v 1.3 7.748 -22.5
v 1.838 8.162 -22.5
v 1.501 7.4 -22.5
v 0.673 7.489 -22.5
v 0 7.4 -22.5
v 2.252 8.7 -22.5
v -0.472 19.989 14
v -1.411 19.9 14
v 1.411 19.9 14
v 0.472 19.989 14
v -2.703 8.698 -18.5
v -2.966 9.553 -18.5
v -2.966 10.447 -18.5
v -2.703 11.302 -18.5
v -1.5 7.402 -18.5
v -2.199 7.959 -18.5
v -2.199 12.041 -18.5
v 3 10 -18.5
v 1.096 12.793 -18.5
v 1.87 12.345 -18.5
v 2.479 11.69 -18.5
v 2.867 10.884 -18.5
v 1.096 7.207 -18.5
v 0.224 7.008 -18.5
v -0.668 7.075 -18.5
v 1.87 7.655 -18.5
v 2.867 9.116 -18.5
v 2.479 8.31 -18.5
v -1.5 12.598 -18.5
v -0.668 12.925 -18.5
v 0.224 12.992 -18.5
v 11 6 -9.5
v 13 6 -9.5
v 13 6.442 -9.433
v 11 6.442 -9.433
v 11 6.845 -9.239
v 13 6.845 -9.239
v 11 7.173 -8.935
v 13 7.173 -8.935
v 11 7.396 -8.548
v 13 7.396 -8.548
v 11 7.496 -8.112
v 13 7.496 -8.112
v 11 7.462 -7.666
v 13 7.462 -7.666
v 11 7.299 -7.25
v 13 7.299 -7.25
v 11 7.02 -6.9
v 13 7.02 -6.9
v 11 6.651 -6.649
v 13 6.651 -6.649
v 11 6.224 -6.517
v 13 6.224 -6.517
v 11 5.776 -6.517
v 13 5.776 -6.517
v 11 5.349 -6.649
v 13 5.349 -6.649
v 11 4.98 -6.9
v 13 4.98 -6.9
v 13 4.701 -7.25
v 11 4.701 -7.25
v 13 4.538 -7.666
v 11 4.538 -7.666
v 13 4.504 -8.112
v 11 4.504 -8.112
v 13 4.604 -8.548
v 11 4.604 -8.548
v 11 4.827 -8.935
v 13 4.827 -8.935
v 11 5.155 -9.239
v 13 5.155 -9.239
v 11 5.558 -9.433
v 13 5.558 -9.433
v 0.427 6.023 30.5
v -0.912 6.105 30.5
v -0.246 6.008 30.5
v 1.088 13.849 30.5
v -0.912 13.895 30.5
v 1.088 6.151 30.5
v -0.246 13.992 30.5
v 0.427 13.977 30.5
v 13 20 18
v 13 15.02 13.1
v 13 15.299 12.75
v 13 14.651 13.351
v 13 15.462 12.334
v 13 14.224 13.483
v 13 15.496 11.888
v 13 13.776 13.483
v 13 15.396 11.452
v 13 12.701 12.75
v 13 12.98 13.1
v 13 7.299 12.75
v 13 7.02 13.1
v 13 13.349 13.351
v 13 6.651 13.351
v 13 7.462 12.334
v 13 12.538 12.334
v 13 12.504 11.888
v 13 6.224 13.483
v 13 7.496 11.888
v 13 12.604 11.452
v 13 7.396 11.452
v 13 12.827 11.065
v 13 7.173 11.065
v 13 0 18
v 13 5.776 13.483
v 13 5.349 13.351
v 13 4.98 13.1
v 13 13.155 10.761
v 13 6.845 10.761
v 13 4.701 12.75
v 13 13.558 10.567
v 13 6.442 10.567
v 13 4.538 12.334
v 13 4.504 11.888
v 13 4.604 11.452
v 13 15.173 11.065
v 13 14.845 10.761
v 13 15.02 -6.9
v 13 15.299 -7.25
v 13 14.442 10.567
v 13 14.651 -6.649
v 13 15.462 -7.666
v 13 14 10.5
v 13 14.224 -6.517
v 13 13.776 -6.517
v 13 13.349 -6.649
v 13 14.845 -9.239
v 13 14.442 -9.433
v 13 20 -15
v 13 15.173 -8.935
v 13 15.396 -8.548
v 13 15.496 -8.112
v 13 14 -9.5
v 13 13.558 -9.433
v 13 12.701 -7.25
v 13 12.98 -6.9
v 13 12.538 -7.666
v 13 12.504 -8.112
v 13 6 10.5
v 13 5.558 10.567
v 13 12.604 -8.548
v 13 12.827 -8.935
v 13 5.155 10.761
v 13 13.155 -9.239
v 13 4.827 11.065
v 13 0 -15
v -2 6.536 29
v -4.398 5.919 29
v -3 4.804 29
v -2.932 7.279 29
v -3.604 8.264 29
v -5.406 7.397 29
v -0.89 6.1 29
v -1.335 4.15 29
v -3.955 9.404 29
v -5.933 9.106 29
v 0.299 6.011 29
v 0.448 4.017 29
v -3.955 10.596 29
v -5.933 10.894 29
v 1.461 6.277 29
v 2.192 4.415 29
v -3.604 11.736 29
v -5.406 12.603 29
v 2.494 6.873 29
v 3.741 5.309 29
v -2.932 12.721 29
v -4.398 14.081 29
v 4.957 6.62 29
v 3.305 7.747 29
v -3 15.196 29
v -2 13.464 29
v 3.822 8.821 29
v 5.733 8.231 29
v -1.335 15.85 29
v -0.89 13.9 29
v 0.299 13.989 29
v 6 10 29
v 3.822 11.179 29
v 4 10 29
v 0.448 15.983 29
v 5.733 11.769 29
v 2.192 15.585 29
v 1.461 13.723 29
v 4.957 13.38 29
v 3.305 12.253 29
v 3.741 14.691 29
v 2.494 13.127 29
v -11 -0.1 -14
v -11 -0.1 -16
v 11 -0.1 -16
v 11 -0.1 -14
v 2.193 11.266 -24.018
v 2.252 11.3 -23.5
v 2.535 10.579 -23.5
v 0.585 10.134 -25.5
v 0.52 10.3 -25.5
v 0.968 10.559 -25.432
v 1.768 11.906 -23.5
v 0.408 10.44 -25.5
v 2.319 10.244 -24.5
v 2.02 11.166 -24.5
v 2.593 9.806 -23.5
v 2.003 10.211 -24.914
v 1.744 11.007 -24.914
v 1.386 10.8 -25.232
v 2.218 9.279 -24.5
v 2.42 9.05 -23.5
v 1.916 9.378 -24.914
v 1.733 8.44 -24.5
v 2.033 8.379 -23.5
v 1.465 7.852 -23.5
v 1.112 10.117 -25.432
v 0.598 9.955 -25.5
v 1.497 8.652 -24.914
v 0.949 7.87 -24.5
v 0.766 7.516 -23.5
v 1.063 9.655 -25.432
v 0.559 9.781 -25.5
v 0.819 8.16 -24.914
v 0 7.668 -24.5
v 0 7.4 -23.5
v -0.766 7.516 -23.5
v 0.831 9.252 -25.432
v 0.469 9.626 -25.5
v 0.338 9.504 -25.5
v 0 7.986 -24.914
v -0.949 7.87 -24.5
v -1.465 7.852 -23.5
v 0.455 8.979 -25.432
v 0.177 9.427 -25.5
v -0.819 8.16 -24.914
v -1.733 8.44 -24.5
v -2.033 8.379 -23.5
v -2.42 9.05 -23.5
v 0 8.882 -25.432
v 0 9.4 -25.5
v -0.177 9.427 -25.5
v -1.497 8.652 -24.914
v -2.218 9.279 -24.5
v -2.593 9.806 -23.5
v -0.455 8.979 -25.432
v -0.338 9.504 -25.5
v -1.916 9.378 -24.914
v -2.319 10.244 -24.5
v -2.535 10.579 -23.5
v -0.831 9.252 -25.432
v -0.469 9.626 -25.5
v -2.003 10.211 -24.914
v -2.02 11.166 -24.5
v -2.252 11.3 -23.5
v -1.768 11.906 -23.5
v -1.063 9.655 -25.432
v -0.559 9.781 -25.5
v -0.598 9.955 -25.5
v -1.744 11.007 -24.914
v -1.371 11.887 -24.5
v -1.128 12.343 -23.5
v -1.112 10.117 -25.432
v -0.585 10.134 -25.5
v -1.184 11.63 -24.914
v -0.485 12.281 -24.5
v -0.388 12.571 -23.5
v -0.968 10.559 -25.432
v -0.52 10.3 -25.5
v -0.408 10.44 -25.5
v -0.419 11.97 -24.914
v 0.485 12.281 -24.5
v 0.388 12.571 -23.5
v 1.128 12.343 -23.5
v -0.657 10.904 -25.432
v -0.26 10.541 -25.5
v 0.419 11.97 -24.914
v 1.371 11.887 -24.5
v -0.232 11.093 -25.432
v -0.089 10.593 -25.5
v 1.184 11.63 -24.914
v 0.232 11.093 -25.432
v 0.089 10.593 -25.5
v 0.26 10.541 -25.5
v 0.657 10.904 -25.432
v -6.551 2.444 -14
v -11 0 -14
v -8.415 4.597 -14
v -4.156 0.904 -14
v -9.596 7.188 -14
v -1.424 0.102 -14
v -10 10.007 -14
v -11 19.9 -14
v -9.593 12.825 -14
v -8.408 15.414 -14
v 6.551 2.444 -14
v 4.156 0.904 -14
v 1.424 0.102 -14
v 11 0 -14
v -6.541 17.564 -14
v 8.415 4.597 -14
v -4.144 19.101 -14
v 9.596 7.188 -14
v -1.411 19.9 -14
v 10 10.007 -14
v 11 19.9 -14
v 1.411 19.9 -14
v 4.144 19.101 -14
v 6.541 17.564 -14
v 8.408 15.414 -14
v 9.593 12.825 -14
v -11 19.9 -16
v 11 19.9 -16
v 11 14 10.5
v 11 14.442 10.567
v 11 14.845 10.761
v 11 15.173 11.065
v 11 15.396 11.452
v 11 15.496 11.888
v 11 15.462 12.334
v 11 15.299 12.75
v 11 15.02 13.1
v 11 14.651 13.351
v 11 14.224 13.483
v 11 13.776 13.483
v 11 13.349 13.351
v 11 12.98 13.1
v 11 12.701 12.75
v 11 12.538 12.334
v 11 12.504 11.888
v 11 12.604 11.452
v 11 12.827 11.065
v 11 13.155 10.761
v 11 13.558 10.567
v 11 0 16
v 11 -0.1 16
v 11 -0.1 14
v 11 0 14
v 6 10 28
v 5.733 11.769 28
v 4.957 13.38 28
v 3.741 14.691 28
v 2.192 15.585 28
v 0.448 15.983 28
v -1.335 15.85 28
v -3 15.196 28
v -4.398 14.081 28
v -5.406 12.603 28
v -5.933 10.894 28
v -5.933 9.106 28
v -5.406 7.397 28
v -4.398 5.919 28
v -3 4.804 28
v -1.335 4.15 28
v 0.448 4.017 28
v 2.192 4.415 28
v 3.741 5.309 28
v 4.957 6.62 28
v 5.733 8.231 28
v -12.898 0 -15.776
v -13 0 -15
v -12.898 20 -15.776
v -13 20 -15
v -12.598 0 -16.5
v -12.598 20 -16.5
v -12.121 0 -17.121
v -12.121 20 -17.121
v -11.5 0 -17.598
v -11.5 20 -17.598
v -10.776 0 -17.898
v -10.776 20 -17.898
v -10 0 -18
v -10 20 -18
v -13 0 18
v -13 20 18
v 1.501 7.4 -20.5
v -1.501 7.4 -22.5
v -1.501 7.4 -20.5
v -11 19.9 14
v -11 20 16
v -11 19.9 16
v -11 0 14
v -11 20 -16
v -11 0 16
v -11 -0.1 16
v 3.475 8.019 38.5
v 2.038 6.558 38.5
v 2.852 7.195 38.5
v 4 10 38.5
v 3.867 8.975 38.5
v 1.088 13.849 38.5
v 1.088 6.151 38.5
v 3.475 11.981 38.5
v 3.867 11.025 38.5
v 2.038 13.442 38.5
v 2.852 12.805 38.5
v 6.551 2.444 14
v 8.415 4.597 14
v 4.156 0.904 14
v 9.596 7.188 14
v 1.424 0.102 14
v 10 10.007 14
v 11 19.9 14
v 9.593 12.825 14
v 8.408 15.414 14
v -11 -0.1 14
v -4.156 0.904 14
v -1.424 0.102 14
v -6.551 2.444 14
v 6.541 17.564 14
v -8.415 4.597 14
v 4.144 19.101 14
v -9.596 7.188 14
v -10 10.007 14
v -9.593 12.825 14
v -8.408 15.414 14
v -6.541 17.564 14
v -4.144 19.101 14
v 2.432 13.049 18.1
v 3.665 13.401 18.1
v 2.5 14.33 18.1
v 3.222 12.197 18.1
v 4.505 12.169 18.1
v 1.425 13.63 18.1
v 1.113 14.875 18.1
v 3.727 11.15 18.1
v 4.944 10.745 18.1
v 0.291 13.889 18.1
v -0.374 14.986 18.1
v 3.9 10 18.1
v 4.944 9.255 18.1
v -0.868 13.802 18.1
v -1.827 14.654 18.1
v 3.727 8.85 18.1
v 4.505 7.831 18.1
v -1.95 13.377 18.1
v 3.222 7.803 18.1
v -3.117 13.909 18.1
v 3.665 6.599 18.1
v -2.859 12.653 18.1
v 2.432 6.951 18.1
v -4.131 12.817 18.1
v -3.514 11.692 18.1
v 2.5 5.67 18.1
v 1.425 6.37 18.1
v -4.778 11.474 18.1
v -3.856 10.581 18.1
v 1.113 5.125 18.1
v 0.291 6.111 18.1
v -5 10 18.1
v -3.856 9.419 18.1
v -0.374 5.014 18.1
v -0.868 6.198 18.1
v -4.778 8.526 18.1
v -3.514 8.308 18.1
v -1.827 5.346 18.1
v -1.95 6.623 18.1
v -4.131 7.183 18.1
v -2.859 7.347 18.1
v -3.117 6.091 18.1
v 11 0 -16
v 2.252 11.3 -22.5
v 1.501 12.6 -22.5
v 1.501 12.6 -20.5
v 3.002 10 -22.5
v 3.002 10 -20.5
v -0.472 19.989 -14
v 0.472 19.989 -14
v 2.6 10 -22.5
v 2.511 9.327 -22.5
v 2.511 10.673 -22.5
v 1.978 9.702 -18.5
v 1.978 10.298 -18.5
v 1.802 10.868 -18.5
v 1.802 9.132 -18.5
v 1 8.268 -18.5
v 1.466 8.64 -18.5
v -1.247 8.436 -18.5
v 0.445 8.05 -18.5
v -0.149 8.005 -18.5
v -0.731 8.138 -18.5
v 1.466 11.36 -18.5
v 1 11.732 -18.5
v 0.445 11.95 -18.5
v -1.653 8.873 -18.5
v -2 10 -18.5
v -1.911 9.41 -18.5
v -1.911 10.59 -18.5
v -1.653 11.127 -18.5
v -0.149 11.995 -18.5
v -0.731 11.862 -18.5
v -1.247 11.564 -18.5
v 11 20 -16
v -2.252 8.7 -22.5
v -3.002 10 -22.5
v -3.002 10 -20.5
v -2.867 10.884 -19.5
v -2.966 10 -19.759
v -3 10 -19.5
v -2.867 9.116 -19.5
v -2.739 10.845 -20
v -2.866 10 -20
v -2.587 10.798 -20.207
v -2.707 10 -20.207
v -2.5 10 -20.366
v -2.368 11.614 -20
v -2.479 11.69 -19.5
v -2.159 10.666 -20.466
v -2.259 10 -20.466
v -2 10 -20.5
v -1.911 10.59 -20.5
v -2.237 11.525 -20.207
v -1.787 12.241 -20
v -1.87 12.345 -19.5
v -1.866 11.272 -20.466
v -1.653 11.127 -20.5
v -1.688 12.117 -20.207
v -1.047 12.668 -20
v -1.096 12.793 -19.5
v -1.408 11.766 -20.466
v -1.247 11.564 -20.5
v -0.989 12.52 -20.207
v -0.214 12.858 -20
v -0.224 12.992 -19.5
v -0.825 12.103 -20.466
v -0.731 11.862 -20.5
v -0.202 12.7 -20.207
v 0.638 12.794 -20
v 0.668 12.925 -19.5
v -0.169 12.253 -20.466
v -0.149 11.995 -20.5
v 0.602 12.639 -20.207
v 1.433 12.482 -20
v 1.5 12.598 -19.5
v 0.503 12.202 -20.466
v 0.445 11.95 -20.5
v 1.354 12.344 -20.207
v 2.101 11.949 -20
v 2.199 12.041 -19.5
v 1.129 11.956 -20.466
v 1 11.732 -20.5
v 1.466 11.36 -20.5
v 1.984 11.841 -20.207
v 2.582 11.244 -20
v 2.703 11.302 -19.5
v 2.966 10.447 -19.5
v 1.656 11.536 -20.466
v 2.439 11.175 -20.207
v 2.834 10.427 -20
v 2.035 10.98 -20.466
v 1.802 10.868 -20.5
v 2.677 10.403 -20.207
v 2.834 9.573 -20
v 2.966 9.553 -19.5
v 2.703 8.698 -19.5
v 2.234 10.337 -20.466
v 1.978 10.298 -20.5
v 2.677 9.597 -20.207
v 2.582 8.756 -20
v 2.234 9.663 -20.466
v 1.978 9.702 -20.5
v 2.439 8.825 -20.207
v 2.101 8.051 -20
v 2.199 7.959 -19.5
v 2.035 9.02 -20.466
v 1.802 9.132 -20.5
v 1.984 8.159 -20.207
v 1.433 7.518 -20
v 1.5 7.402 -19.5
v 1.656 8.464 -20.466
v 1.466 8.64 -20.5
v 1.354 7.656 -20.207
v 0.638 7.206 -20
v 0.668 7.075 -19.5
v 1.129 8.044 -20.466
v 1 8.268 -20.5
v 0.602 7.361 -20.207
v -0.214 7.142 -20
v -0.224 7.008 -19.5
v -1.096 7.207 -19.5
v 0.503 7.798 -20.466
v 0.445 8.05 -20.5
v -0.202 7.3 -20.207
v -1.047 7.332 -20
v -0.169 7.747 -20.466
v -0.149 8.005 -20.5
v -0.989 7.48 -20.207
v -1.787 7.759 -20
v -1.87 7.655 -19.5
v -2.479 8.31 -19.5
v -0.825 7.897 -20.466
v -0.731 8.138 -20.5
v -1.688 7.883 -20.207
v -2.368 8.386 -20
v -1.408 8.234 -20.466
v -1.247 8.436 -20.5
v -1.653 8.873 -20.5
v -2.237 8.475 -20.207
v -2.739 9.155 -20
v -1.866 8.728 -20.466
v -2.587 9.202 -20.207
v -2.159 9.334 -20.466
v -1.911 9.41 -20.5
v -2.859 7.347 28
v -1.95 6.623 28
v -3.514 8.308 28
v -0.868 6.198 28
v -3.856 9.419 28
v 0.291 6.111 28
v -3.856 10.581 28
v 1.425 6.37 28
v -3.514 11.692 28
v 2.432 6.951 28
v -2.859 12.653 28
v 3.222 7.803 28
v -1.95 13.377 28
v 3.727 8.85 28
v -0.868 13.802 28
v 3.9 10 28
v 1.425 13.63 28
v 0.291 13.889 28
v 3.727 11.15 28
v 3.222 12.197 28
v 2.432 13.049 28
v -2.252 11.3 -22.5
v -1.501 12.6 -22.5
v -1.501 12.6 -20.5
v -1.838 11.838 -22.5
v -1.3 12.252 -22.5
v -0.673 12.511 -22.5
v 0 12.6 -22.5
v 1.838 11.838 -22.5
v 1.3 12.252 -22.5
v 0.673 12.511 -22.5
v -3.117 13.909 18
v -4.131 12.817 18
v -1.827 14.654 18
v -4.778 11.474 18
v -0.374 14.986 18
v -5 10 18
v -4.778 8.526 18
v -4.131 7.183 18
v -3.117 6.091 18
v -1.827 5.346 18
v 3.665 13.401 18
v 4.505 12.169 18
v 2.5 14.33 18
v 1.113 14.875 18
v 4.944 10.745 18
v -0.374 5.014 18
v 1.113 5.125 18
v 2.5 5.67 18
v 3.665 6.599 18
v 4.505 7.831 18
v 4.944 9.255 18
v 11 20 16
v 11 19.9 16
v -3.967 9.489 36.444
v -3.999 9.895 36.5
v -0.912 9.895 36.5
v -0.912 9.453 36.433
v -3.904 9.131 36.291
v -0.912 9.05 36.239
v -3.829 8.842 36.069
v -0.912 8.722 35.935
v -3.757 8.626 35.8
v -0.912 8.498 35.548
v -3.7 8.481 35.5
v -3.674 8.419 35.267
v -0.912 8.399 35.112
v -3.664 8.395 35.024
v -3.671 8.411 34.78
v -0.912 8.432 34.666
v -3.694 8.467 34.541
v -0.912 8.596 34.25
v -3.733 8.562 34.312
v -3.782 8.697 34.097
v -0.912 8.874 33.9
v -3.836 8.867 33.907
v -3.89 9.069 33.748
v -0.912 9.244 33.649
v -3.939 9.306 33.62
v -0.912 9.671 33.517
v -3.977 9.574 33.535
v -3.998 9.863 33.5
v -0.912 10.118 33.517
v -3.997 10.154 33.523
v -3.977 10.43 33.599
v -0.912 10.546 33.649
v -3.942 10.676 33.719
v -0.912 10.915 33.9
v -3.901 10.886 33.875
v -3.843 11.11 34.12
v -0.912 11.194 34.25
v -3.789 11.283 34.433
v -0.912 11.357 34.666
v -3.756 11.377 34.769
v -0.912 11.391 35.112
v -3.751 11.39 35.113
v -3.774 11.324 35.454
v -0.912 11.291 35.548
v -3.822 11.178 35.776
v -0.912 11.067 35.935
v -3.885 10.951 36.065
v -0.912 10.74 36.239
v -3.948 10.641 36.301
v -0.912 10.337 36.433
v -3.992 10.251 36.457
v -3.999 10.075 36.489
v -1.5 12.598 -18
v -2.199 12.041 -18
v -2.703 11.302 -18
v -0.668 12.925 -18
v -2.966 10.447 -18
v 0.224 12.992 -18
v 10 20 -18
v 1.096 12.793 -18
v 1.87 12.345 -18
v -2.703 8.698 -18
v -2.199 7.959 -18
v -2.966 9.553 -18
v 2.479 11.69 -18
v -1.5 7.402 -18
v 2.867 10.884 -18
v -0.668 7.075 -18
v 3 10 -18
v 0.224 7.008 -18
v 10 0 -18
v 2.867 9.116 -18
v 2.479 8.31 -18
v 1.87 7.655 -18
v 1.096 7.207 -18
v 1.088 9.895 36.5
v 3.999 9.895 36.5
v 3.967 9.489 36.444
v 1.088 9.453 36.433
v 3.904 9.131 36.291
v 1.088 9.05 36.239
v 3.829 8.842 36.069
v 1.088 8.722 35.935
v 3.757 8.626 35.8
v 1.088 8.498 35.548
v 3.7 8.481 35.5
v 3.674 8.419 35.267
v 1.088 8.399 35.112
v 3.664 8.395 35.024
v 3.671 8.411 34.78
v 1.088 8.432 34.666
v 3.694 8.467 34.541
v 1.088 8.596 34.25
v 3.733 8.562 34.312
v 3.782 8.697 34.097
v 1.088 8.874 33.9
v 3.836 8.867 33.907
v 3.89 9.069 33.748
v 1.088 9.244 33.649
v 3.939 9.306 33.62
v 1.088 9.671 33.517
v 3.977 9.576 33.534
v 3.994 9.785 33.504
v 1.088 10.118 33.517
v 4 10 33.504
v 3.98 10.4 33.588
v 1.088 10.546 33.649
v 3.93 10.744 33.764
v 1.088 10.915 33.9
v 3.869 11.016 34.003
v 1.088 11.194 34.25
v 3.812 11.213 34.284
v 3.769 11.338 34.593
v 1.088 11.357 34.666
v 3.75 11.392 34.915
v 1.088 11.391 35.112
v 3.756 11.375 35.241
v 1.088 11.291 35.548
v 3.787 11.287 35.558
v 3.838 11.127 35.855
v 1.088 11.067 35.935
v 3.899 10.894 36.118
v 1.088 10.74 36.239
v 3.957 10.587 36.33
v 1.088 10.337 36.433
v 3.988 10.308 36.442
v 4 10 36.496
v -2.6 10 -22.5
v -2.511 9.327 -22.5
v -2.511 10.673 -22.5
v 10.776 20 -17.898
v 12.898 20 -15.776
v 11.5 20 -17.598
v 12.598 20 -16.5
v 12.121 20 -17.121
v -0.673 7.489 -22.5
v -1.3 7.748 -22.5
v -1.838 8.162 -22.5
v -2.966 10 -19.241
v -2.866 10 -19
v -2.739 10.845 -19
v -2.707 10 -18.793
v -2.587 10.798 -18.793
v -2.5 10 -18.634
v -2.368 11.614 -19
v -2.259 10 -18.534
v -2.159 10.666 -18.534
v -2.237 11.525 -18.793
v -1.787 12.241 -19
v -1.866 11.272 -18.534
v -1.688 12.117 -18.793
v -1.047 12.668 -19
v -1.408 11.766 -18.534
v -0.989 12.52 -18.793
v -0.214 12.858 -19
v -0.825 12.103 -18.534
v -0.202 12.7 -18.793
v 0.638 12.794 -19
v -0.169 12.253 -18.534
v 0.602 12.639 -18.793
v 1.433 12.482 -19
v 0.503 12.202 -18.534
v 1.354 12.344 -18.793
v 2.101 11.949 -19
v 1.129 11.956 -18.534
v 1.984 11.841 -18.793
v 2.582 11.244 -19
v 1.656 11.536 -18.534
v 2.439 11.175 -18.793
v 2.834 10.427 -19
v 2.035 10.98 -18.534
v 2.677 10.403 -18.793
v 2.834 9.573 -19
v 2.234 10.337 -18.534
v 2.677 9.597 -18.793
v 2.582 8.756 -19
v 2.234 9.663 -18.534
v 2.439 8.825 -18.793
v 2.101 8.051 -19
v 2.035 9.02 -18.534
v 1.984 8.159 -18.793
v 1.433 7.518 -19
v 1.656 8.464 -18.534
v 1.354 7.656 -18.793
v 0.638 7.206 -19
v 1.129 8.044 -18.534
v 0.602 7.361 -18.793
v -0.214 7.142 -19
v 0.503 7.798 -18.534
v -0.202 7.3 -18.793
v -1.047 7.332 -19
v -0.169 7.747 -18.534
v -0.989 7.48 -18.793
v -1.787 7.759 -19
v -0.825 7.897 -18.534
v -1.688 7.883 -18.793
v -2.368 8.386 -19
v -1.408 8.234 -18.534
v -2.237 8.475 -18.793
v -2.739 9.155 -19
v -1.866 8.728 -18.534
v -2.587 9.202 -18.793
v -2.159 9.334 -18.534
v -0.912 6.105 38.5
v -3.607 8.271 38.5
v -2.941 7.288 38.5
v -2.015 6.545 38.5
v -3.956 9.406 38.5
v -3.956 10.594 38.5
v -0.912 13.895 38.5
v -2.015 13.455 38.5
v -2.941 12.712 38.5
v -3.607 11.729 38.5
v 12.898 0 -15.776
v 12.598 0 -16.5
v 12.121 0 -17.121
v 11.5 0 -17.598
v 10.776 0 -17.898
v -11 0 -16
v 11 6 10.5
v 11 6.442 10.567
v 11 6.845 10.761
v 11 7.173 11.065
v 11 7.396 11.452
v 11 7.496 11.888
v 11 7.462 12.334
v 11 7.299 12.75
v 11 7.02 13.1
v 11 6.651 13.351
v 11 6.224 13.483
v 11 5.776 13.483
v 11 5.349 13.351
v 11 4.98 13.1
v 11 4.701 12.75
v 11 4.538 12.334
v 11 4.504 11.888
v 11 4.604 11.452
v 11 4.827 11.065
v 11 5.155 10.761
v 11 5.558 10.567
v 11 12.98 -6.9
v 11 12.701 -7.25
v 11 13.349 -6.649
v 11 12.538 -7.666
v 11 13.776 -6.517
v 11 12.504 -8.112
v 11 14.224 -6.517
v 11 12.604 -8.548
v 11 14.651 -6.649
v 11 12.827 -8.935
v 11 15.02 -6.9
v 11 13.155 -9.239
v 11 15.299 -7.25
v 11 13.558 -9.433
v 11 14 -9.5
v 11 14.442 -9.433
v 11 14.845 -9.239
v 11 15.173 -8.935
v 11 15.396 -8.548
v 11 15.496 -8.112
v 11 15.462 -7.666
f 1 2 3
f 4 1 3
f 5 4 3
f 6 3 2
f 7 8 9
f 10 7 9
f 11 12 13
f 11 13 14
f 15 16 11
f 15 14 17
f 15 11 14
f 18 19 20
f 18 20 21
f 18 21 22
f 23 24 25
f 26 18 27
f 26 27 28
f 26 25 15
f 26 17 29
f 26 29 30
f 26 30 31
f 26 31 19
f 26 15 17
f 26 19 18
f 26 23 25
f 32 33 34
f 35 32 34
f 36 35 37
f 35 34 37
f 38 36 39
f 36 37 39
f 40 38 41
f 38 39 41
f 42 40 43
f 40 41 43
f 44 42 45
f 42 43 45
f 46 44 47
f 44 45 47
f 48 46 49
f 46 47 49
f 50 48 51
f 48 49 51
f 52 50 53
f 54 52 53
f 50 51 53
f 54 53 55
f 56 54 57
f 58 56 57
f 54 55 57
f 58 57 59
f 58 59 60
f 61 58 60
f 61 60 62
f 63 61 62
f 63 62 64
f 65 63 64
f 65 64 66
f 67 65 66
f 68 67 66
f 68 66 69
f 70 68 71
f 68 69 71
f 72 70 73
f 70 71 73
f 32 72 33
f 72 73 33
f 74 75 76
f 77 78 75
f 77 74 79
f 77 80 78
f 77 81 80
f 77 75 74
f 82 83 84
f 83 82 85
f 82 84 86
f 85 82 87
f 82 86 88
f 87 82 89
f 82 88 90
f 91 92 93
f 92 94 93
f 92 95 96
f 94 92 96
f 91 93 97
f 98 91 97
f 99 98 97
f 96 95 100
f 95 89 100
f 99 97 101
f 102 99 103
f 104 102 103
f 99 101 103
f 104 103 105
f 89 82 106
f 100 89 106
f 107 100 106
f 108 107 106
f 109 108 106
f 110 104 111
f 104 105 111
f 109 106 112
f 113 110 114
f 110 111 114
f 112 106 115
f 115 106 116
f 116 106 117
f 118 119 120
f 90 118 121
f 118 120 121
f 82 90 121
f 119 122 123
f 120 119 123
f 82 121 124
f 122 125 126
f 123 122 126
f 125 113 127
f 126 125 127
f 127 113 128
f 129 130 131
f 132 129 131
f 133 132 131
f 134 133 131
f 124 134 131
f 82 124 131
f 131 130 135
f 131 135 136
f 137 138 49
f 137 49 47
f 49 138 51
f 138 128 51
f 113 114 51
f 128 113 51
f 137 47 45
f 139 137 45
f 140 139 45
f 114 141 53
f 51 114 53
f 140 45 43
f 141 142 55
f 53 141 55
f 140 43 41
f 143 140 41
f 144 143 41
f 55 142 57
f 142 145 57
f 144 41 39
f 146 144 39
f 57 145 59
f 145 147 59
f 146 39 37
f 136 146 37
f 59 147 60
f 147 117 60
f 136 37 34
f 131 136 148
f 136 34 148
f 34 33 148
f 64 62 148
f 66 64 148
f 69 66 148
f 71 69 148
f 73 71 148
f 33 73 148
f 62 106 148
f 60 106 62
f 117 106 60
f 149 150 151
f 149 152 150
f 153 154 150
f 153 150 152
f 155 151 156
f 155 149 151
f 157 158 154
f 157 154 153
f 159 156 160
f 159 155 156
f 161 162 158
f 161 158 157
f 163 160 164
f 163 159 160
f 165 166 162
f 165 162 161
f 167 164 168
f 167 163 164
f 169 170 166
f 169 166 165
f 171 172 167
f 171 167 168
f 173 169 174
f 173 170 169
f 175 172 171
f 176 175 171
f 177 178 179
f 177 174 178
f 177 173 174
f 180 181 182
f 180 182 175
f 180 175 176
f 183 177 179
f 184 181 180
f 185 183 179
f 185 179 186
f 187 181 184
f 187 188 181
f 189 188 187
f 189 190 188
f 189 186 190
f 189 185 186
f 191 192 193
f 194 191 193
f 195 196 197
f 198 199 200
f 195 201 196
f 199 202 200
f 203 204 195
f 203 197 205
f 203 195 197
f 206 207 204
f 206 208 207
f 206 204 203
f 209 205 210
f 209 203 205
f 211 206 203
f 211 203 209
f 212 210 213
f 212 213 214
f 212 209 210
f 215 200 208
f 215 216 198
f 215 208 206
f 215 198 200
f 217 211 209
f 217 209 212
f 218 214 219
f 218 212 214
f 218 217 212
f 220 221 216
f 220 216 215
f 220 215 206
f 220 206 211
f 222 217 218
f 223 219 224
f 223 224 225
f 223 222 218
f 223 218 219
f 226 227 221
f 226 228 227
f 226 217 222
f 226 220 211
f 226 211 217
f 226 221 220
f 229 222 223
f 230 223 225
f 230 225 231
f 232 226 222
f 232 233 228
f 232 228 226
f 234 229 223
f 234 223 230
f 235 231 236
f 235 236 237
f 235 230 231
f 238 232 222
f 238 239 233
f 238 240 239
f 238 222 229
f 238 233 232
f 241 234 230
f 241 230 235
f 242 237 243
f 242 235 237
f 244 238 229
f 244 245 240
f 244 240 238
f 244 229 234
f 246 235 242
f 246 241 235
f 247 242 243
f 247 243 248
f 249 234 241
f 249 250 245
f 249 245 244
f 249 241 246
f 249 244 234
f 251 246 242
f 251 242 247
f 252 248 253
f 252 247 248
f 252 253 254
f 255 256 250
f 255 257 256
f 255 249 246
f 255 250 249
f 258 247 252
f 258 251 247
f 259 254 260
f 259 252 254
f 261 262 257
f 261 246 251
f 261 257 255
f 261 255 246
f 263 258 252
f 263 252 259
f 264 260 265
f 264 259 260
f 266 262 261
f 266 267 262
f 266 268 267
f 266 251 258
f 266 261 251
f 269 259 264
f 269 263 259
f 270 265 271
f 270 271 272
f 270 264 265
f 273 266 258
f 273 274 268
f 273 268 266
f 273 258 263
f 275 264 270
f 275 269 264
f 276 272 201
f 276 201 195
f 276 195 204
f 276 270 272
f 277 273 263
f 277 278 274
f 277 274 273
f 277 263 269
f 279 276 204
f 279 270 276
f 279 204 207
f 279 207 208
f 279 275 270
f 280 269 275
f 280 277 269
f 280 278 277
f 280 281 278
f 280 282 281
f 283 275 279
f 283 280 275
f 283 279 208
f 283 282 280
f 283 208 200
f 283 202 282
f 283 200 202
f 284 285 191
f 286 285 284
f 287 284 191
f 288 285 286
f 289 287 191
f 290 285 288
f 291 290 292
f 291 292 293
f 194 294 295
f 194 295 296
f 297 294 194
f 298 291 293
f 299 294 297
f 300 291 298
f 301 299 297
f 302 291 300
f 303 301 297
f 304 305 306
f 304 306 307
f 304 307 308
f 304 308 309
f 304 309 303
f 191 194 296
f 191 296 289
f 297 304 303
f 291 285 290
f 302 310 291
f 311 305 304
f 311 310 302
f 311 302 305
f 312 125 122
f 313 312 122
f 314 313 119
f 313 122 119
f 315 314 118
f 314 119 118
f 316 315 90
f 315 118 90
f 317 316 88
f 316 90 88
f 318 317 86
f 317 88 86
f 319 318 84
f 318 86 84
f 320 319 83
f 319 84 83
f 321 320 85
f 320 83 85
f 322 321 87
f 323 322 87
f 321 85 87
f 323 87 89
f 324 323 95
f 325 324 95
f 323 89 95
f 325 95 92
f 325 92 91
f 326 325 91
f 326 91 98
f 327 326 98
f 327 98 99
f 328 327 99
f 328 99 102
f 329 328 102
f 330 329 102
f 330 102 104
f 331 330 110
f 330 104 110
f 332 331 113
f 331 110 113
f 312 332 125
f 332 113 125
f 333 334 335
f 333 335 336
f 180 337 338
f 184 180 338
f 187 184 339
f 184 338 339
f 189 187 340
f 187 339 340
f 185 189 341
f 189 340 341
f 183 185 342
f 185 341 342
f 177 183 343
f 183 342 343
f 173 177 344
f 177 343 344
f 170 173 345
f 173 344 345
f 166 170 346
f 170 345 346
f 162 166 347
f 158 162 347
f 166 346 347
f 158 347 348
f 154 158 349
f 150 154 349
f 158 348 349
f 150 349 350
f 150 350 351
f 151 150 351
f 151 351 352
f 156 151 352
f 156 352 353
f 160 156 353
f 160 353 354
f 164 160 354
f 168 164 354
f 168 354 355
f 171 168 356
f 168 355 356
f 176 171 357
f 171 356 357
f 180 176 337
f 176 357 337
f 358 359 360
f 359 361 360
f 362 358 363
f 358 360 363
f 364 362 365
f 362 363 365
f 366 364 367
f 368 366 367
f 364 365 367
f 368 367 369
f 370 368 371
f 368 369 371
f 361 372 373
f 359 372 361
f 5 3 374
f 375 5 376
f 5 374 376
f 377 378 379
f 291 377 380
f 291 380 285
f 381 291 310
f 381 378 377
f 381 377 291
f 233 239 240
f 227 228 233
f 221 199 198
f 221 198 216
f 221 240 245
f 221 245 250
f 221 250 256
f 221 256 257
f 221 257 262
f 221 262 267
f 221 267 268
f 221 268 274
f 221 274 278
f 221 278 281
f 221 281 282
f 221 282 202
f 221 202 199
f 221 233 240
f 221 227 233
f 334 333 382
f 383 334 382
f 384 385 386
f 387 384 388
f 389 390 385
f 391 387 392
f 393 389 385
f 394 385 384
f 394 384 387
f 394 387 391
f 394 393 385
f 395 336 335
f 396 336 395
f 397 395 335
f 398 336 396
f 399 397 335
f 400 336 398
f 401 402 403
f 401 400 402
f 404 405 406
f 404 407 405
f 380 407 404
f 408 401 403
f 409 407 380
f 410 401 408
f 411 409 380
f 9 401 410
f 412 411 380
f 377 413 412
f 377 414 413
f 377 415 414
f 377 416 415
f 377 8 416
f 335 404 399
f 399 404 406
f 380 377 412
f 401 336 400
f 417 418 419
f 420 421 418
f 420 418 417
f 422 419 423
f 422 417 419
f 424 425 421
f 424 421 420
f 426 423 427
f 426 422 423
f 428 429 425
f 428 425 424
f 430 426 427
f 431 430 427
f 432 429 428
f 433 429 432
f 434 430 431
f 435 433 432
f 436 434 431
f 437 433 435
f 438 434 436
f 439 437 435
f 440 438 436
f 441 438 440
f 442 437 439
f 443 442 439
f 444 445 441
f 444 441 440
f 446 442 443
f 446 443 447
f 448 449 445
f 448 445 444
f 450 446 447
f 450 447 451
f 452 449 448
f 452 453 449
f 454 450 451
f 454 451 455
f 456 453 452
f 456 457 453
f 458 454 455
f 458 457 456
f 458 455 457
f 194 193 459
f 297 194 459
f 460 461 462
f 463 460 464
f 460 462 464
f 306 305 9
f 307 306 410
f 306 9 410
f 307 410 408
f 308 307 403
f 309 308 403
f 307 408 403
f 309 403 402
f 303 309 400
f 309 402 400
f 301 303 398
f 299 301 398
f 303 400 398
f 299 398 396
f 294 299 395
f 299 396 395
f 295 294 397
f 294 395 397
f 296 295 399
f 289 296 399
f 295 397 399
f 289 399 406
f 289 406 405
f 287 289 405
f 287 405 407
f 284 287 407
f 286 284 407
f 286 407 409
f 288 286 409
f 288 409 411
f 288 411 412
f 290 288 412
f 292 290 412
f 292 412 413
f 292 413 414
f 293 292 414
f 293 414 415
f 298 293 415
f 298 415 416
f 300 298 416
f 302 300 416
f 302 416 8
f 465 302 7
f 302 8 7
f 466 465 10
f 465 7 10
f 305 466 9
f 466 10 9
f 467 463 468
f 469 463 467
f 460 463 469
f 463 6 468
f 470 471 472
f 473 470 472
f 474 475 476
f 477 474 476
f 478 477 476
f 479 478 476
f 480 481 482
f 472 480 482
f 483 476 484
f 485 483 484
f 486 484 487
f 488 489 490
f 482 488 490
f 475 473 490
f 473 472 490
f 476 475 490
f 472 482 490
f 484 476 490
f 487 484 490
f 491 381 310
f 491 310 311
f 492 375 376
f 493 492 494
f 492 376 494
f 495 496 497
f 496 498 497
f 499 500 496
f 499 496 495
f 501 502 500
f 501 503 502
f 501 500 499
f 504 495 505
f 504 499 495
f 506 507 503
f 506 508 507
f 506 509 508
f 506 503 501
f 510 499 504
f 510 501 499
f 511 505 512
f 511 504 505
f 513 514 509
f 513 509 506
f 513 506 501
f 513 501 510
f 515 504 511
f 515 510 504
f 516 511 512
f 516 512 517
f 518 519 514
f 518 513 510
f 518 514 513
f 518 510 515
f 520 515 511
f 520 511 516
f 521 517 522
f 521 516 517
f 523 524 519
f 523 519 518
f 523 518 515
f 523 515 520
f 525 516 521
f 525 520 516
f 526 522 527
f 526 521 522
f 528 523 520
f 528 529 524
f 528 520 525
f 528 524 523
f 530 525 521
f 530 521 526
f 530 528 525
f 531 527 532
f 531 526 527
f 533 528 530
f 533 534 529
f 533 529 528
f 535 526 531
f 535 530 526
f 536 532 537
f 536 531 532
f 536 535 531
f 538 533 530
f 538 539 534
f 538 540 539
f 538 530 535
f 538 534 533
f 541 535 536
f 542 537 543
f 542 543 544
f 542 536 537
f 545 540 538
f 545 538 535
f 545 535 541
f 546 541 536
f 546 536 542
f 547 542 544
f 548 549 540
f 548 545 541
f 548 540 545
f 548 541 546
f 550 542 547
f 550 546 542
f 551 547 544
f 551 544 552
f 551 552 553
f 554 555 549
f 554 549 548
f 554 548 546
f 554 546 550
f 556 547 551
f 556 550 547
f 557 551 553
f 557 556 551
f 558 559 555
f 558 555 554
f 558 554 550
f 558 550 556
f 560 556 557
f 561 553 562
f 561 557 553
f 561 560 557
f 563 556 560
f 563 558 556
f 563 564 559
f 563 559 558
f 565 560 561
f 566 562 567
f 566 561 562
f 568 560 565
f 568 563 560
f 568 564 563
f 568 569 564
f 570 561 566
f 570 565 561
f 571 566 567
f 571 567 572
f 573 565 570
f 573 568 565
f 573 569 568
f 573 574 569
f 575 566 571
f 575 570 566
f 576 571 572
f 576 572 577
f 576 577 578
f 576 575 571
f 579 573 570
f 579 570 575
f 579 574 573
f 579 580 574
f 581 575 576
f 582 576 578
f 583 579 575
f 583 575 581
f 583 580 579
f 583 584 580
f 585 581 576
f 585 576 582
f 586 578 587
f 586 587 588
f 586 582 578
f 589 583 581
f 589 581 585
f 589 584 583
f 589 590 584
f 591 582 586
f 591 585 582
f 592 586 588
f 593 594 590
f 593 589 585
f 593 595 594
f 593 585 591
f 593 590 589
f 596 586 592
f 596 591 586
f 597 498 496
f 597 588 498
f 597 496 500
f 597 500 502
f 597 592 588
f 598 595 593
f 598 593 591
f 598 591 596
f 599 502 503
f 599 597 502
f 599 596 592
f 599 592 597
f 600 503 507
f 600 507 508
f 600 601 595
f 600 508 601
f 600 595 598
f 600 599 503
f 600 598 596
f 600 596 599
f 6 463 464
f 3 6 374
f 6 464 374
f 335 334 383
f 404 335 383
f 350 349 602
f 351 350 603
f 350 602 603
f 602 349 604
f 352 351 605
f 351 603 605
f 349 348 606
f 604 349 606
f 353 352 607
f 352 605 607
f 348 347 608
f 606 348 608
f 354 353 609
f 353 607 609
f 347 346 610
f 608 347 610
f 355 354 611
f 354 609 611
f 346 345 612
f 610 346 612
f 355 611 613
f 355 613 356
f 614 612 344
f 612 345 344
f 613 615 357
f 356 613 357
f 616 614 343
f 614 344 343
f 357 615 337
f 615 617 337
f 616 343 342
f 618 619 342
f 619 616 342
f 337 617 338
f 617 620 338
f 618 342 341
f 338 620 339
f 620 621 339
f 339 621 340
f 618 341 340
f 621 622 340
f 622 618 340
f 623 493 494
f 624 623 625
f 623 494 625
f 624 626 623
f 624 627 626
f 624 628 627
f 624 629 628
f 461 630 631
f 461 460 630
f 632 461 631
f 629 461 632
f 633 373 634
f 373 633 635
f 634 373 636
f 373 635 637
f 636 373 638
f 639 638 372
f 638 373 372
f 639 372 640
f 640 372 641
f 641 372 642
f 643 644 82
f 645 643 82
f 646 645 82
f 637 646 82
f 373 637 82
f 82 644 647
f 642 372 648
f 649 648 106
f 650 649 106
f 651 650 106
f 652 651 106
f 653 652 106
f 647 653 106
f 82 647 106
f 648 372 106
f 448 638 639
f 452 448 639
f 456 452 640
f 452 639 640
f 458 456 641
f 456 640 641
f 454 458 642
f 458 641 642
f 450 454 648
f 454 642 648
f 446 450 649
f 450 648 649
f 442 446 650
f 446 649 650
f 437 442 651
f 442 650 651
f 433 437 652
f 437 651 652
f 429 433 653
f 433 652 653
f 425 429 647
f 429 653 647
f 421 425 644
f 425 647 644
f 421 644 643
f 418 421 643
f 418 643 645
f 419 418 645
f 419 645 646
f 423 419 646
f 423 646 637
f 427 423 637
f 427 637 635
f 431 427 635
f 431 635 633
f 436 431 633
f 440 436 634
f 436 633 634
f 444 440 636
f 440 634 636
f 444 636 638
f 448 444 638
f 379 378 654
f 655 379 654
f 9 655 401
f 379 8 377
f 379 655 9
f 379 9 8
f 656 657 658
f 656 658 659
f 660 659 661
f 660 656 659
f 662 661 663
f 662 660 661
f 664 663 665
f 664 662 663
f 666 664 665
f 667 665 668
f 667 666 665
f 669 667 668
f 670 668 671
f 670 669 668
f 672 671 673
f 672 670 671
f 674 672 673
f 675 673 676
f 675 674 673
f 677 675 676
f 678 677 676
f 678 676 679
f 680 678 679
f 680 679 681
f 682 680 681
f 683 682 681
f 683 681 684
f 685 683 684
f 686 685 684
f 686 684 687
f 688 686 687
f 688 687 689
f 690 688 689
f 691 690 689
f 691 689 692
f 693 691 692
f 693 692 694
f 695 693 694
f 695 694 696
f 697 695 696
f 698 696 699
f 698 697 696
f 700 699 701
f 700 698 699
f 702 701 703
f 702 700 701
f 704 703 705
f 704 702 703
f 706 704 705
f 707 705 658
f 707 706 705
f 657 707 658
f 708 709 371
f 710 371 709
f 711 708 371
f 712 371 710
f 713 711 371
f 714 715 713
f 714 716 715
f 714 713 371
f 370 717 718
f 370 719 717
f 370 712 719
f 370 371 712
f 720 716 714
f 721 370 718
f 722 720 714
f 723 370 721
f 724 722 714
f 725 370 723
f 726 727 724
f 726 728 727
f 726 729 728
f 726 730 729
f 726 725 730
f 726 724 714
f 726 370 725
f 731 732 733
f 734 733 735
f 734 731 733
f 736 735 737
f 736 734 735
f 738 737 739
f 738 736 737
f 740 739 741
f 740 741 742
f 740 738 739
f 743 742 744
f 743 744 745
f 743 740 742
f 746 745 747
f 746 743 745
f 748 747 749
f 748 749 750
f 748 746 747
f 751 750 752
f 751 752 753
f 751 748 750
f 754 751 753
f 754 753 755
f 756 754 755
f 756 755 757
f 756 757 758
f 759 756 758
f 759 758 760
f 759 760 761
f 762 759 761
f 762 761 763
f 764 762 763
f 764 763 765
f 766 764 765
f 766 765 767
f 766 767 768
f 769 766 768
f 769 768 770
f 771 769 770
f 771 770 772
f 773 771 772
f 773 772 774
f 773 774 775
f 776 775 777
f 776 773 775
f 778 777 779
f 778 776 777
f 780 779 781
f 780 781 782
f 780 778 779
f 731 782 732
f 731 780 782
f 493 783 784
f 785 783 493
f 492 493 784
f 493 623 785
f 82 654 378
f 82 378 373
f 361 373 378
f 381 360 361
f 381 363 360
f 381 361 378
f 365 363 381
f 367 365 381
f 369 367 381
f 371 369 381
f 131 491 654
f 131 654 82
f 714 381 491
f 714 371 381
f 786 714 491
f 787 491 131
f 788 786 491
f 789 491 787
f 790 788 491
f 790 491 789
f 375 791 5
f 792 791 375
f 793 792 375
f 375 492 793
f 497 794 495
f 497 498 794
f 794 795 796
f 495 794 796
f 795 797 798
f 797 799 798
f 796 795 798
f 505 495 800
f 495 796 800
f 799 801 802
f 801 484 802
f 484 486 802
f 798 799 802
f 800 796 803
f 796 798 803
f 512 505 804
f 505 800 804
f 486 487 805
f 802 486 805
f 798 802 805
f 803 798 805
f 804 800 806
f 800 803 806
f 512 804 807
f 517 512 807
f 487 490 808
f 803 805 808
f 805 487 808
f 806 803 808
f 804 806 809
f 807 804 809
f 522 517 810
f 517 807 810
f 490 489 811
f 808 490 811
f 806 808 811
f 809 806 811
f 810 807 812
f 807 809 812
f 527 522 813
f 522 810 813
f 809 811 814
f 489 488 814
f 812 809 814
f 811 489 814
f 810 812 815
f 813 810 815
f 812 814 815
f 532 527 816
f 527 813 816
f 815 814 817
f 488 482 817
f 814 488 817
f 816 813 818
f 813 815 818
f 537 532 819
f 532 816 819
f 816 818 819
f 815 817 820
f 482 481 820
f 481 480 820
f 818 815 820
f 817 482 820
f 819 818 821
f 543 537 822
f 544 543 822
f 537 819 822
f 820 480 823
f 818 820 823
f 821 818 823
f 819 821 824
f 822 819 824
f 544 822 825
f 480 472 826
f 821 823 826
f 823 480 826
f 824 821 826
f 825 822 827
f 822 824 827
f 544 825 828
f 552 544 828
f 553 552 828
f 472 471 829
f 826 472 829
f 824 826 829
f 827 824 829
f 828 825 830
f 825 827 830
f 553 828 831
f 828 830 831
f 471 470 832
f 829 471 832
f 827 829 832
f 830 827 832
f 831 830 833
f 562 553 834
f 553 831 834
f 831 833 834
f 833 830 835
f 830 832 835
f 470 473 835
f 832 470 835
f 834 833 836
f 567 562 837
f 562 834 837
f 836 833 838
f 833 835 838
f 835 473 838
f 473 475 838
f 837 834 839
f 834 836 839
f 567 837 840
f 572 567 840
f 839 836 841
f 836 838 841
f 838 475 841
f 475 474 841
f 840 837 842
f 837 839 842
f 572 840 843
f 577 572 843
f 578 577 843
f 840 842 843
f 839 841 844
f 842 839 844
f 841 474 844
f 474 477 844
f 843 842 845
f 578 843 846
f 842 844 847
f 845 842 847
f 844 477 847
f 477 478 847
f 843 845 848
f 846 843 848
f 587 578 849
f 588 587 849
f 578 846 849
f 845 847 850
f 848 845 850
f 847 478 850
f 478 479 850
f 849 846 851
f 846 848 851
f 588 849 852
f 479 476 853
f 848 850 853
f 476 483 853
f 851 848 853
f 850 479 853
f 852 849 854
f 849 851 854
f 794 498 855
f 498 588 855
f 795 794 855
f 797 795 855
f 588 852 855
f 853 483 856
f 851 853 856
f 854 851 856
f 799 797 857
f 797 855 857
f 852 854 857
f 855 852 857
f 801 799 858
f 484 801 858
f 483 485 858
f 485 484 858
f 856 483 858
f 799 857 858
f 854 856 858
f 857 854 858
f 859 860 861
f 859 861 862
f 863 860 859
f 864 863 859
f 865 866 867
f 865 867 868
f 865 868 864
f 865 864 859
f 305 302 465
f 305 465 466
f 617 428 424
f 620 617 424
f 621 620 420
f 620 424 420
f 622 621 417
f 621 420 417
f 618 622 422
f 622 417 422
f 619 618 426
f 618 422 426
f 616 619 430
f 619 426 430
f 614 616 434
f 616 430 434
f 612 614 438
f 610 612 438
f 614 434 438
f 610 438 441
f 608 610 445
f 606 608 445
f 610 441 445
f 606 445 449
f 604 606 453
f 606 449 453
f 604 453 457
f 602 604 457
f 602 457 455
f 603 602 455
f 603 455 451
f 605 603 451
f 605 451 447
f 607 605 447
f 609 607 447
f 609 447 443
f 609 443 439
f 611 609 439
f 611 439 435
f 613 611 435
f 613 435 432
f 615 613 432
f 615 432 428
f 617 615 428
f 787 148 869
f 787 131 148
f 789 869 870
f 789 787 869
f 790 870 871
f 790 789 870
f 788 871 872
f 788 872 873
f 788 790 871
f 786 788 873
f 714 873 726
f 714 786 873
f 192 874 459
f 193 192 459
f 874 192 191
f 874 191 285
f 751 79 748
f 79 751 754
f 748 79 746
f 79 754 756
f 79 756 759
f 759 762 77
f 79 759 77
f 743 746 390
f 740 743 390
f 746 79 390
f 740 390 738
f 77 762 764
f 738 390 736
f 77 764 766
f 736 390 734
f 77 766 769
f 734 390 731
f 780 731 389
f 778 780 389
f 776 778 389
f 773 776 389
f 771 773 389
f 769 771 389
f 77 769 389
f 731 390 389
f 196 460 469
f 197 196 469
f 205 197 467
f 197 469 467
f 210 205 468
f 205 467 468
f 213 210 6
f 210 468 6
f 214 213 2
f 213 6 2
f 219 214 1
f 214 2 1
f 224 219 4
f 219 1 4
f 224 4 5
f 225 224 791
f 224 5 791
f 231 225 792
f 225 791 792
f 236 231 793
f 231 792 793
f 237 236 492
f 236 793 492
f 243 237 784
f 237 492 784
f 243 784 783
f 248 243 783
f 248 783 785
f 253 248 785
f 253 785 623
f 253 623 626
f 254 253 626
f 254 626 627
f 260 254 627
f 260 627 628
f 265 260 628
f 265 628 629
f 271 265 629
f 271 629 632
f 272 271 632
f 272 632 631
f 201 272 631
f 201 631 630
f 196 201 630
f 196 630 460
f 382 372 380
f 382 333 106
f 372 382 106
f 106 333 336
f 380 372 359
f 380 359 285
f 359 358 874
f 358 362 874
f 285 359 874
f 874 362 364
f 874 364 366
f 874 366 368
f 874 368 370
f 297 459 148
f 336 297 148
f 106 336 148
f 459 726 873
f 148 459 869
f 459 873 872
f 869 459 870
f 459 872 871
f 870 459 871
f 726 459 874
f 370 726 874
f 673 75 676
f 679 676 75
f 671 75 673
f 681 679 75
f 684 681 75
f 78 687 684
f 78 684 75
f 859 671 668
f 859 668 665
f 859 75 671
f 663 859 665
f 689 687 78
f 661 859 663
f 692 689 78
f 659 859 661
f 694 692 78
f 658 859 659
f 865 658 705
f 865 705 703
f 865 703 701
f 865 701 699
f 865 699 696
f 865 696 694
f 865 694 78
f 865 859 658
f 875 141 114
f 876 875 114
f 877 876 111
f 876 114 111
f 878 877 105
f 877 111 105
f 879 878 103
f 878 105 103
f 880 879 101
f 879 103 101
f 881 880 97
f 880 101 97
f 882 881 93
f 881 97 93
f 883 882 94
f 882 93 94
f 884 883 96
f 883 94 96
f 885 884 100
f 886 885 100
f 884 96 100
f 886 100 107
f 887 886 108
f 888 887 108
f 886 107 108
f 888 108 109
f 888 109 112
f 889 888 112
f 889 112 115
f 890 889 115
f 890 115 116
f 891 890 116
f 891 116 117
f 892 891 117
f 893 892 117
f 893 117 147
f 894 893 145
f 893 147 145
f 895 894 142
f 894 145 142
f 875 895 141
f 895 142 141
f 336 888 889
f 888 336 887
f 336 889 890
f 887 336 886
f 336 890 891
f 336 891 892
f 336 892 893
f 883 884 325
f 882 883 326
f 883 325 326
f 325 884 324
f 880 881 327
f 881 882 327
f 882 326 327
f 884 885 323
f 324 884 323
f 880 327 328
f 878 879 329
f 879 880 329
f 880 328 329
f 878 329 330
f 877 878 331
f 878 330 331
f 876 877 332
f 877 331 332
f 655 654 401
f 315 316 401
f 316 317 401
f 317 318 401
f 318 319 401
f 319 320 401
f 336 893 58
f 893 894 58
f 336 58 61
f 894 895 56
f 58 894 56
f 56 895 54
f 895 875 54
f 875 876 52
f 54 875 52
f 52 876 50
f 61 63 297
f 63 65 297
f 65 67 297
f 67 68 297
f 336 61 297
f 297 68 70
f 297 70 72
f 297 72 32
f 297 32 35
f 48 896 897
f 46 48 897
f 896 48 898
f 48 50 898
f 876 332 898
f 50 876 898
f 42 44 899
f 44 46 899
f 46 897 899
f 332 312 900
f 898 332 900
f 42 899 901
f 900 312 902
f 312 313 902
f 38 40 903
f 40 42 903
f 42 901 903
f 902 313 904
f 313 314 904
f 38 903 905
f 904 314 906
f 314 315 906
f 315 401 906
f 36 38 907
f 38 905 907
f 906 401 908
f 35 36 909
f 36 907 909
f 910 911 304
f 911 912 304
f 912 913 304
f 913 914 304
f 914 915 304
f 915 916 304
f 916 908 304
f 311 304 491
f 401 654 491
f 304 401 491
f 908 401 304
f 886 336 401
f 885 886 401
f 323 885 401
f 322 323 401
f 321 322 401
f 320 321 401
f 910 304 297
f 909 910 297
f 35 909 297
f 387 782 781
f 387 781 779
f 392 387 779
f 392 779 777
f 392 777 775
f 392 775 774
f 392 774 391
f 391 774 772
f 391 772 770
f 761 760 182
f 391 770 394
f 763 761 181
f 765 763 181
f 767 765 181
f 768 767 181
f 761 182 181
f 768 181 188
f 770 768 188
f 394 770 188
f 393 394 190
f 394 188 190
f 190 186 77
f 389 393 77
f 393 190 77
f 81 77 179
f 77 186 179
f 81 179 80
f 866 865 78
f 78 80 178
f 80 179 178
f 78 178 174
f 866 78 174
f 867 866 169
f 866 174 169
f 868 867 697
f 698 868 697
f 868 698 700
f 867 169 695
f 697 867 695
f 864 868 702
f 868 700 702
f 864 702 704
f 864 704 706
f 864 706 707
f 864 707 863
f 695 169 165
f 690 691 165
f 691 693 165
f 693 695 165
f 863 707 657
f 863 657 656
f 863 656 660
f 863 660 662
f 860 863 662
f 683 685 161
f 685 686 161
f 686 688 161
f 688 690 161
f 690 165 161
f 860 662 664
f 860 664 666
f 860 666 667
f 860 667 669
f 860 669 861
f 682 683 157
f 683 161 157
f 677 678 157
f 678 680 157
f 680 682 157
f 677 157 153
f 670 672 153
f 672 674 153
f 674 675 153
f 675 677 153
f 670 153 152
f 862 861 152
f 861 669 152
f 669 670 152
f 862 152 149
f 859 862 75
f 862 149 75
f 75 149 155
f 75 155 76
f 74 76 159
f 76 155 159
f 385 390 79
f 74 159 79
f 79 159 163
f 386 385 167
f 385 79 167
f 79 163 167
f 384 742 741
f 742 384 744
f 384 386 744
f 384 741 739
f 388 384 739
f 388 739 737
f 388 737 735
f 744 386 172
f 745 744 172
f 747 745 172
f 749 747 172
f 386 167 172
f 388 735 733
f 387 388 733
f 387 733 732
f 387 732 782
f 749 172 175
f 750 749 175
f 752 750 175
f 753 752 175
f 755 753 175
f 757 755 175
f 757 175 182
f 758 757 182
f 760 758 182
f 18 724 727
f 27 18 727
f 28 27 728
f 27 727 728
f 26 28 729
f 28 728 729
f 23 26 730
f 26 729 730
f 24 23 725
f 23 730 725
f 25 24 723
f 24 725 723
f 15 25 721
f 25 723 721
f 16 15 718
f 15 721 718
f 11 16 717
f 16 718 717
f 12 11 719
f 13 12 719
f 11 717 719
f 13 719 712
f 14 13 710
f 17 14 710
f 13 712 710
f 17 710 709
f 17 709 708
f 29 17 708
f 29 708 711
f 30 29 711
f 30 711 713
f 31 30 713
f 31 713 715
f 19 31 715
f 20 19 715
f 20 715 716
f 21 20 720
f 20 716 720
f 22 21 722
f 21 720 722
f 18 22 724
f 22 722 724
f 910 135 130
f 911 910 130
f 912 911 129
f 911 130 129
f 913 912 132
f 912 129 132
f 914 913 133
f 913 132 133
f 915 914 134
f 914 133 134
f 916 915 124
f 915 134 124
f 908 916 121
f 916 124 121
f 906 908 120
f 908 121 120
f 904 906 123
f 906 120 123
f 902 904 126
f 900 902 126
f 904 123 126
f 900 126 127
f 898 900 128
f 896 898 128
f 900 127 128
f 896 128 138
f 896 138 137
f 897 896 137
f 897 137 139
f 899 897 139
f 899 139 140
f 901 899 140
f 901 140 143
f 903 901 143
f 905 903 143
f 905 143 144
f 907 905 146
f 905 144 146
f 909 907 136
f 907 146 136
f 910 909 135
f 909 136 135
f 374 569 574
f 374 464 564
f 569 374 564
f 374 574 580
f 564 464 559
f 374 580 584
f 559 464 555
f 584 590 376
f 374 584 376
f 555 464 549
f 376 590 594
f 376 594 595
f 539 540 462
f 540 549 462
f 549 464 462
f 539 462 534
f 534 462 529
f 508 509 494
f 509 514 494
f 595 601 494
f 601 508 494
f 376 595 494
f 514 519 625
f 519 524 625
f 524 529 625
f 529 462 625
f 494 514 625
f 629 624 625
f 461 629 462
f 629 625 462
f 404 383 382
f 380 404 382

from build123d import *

# Parameters (mm, degrees)
SKETCH1_W               = 26
SKETCH1_H               = 36
BOSS_EXTRUDE1_DEPTH     = 20
FILLET1_R               = 3
SKETCH2_W               = 22
SKETCH2_H               = 32
CUT_EXTRUDE1_DEPTH      = 20
SKETCH5_W               = 22
SKETCH5_H               = 20
BOSS_EXTRUDE3_DEPTH     = 2
SKETCH6_W               = 22
SKETCH6_H               = 20
BOSS_EXTRUDE4_DEPTH     = 2
SKETCH7_R               = 10
BOSS_EXTRUDE5_DEPTH     = 28
SKETCH8_R               = 3
BOSS_EXTRUDE6_DEPTH     = 0.5
SKETCH9_R               = 3
BOSS_EXTRUDE7_DEPTH     = 2
FILLET2_R               = 1
BOSS_EXTRUDE8_DEPTH     = 2
SKETCH11_R              = 2.6
BOSS_EXTRUDE9_DEPTH     = 3
FILLET4_R               = 2
SKETCH12_R              = 3.9
BOSS_EXTRUDE10_DEPTH    = 10
SKETCH13_R              = 6
BOSS_EXTRUDE11_DEPTH    = 1
SKETCH14_R              = 4
BOSS_EXTRUDE12_DEPTH    = 9.5
SKETCH15_W              = 2
SKETCH15_H              = 8
CUT_EXTRUDE3_DEPTH      = 8
CUT_EXTRUDE4_DEPTH      = 5
CUT_EXTRUDE4_DEPTH_BACK = 5
SKETCH16_R              = 1.5
SKETCH17_R              = 5
BOSS_EXTRUDE13_DEPTH    = 0.1
SKETCH18_R              = 1.5
CUT_EXTRUDE5_DEPTH      = 2


with BuildPart() as part:
    # Sketch1 → Boss-Extrude1 (new body)
    with BuildSketch(Plane(origin=(0, 0, 0), x_dir=(1, 0, 0), z_dir=(0, 1, 0))):
        Rectangle(SKETCH1_W, SKETCH1_H)
    extrude(amount=BOSS_EXTRUDE1_DEPTH)

    # Fillet1
    fillet1_edges = [part.edges().sort_by_distance(p)[0] for p in [
        (-13, 10, -18),
        (13, 10, -18),
    ]]
    fillet(fillet1_edges, radius=FILLET1_R)

    # Sketch2 → Cut-Extrude1 (cut)
    with BuildSketch(Plane(origin=(0, 20, 0), x_dir=(1, 0, 0), z_dir=(0, 1, 0))):
        Rectangle(SKETCH2_W, SKETCH2_H)
    extrude(amount=-CUT_EXTRUDE1_DEPTH, mode=Mode.SUBTRACT)

    # Sketch5 → Boss-Extrude3 (add)
    with BuildSketch(Plane.XY.offset(-16)):
        with Locations((0, 9.9)):
            Rectangle(SKETCH5_W, SKETCH5_H)
    extrude(amount=BOSS_EXTRUDE3_DEPTH)

    # Sketch6 → Boss-Extrude4 (add)
    with BuildSketch(Plane(origin=(0, 0, 16), x_dir=(-1, 0, 0), z_dir=(0, 0, -1))):
        with Locations((0, 9.9)):
            Rectangle(SKETCH6_W, SKETCH6_H)
    extrude(amount=BOSS_EXTRUDE4_DEPTH)

    # Sketch7 → Boss-Extrude5 (add)
    with BuildSketch(Plane(origin=(0, 0, 14), x_dir=(-1, 0, 0), z_dir=(0, 0, -1))):
        with Locations(Location((0, 10, 0), (0, 0, 98.109614456))):
            Circle(SKETCH7_R)
    extrude(amount=BOSS_EXTRUDE5_DEPTH)

    # Sketch8 → Boss-Extrude6 (add)
    with BuildSketch(Plane(origin=(0, 0, -18), x_dir=(-1, 0, 0), z_dir=(0, 0, -1))):
        with Locations(Location((0, 10, 0), (0, 0, 180))):
            Circle(SKETCH8_R)
    extrude(amount=BOSS_EXTRUDE6_DEPTH)

    # Sketch12 → Boss-Extrude10 (add)
    with BuildSketch(Plane.XY.offset(18)):
        with Locations((0, 10)):
            Circle(SKETCH12_R)
    extrude(amount=BOSS_EXTRUDE10_DEPTH)

    # Sketch13 → Boss-Extrude11 (add)
    with BuildSketch(Plane.XY.offset(28)):
        with Locations((0, 10)):
            Circle(SKETCH13_R)
    extrude(amount=BOSS_EXTRUDE11_DEPTH)

    # Sketch14 → Boss-Extrude12 (add)
    with BuildSketch(Plane.XY.offset(29)):
        with Locations((0, 10)):
            Circle(SKETCH14_R)
    extrude(amount=BOSS_EXTRUDE12_DEPTH)

    # Sketch15 → Cut-Extrude3 (cut)
    with BuildSketch(Plane.XY.offset(38.5)):
        with Locations((0.08840706, 10)):
            Rectangle(SKETCH15_W, SKETCH15_H)
    extrude(amount=-CUT_EXTRUDE3_DEPTH, mode=Mode.SUBTRACT)

    # Sketch16 → Cut-Extrude4 (cut, two sides: drawn at the far end of the back side and taken through both)
    with BuildSketch(Plane(origin=(-0.91159294, 0, 0), x_dir=(0, 0, -1), z_dir=(1, 0, 0)).offset(-CUT_EXTRUDE4_DEPTH_BACK)):
        with Locations(Location((-35, 9.894739826, 0), (0, 0, 180))):
            Circle(SKETCH16_R)
    extrude(amount=CUT_EXTRUDE4_DEPTH + CUT_EXTRUDE4_DEPTH_BACK, mode=Mode.SUBTRACT)

    # Sketch17 → Boss-Extrude13 (add)
    with BuildSketch(Plane.XY.offset(18)):
        with Locations(Location((0, 10, 0), (0, 0, 180))):
            Circle(SKETCH17_R)
    extrude(amount=BOSS_EXTRUDE13_DEPTH)

    # Sketch18 → Cut-Extrude5 (cut)
    with BuildSketch(Plane(origin=(13, 0, 0), x_dir=(0, 0, -1), z_dir=(1, 0, 0))):
        with Locations((-12, 14)):
            Circle(SKETCH18_R)
        with Locations((8, 14)):
            Circle(SKETCH18_R)
        with Locations((8, 6)):
            Circle(SKETCH18_R)
        with Locations((-12, 6)):
            Circle(SKETCH18_R)
    extrude(amount=-CUT_EXTRUDE5_DEPTH, mode=Mode.SUBTRACT)


with BuildPart() as body_2:
    # Sketch9 → Boss-Extrude7 (new body)
    with BuildSketch(Plane(origin=(0, 0, -18.5), x_dir=(-1, 0, 0), z_dir=(0, 0, -1))):
        with Locations((0, 10)):
            Circle(SKETCH9_R)
    extrude(amount=BOSS_EXTRUDE7_DEPTH)

    # Fillet2
    fillet2_edges = [body_2.edges().sort_by_distance(p)[0] for p in [
        (3, 10, -18.5),
        (3, 10, -20.5),
    ]]
    fillet(fillet2_edges, radius=FILLET2_R - 0.0001)  # a hair under: the kernel refuses the full size

    # Sketch10 → Boss-Extrude8 (add)
    with BuildSketch(Plane(origin=(0, 0, -20.5), x_dir=(-1, 0, 0), z_dir=(0, 0, -1))):
        Polygon((3.0022214, 10), (1.5011107, 12.6), (-1.5011107, 12.6), (-3.0022214, 10), (-1.5011107, 7.4), (1.5011107, 7.4), align=None)
    extrude(amount=BOSS_EXTRUDE8_DEPTH)

    # Sketch11 → Boss-Extrude9 (add)
    with BuildSketch(Plane(origin=(0, 0, -22.5), x_dir=(-1, 0, 0), z_dir=(0, 0, -1))):
        with Locations(Location((0, 10, 0), (0, 0, 150))):
            Circle(SKETCH11_R)
    extrude(amount=BOSS_EXTRUDE9_DEPTH)

    # Fillet4
    fillet4_edges = [body_2.edges().sort_by_distance(p)[0] for p in [
        (-2.25166605, 8.7, -25.5),
    ]]
    fillet(fillet4_edges, radius=FILLET4_R)


solid = Compound([part.part, body_2.part])
